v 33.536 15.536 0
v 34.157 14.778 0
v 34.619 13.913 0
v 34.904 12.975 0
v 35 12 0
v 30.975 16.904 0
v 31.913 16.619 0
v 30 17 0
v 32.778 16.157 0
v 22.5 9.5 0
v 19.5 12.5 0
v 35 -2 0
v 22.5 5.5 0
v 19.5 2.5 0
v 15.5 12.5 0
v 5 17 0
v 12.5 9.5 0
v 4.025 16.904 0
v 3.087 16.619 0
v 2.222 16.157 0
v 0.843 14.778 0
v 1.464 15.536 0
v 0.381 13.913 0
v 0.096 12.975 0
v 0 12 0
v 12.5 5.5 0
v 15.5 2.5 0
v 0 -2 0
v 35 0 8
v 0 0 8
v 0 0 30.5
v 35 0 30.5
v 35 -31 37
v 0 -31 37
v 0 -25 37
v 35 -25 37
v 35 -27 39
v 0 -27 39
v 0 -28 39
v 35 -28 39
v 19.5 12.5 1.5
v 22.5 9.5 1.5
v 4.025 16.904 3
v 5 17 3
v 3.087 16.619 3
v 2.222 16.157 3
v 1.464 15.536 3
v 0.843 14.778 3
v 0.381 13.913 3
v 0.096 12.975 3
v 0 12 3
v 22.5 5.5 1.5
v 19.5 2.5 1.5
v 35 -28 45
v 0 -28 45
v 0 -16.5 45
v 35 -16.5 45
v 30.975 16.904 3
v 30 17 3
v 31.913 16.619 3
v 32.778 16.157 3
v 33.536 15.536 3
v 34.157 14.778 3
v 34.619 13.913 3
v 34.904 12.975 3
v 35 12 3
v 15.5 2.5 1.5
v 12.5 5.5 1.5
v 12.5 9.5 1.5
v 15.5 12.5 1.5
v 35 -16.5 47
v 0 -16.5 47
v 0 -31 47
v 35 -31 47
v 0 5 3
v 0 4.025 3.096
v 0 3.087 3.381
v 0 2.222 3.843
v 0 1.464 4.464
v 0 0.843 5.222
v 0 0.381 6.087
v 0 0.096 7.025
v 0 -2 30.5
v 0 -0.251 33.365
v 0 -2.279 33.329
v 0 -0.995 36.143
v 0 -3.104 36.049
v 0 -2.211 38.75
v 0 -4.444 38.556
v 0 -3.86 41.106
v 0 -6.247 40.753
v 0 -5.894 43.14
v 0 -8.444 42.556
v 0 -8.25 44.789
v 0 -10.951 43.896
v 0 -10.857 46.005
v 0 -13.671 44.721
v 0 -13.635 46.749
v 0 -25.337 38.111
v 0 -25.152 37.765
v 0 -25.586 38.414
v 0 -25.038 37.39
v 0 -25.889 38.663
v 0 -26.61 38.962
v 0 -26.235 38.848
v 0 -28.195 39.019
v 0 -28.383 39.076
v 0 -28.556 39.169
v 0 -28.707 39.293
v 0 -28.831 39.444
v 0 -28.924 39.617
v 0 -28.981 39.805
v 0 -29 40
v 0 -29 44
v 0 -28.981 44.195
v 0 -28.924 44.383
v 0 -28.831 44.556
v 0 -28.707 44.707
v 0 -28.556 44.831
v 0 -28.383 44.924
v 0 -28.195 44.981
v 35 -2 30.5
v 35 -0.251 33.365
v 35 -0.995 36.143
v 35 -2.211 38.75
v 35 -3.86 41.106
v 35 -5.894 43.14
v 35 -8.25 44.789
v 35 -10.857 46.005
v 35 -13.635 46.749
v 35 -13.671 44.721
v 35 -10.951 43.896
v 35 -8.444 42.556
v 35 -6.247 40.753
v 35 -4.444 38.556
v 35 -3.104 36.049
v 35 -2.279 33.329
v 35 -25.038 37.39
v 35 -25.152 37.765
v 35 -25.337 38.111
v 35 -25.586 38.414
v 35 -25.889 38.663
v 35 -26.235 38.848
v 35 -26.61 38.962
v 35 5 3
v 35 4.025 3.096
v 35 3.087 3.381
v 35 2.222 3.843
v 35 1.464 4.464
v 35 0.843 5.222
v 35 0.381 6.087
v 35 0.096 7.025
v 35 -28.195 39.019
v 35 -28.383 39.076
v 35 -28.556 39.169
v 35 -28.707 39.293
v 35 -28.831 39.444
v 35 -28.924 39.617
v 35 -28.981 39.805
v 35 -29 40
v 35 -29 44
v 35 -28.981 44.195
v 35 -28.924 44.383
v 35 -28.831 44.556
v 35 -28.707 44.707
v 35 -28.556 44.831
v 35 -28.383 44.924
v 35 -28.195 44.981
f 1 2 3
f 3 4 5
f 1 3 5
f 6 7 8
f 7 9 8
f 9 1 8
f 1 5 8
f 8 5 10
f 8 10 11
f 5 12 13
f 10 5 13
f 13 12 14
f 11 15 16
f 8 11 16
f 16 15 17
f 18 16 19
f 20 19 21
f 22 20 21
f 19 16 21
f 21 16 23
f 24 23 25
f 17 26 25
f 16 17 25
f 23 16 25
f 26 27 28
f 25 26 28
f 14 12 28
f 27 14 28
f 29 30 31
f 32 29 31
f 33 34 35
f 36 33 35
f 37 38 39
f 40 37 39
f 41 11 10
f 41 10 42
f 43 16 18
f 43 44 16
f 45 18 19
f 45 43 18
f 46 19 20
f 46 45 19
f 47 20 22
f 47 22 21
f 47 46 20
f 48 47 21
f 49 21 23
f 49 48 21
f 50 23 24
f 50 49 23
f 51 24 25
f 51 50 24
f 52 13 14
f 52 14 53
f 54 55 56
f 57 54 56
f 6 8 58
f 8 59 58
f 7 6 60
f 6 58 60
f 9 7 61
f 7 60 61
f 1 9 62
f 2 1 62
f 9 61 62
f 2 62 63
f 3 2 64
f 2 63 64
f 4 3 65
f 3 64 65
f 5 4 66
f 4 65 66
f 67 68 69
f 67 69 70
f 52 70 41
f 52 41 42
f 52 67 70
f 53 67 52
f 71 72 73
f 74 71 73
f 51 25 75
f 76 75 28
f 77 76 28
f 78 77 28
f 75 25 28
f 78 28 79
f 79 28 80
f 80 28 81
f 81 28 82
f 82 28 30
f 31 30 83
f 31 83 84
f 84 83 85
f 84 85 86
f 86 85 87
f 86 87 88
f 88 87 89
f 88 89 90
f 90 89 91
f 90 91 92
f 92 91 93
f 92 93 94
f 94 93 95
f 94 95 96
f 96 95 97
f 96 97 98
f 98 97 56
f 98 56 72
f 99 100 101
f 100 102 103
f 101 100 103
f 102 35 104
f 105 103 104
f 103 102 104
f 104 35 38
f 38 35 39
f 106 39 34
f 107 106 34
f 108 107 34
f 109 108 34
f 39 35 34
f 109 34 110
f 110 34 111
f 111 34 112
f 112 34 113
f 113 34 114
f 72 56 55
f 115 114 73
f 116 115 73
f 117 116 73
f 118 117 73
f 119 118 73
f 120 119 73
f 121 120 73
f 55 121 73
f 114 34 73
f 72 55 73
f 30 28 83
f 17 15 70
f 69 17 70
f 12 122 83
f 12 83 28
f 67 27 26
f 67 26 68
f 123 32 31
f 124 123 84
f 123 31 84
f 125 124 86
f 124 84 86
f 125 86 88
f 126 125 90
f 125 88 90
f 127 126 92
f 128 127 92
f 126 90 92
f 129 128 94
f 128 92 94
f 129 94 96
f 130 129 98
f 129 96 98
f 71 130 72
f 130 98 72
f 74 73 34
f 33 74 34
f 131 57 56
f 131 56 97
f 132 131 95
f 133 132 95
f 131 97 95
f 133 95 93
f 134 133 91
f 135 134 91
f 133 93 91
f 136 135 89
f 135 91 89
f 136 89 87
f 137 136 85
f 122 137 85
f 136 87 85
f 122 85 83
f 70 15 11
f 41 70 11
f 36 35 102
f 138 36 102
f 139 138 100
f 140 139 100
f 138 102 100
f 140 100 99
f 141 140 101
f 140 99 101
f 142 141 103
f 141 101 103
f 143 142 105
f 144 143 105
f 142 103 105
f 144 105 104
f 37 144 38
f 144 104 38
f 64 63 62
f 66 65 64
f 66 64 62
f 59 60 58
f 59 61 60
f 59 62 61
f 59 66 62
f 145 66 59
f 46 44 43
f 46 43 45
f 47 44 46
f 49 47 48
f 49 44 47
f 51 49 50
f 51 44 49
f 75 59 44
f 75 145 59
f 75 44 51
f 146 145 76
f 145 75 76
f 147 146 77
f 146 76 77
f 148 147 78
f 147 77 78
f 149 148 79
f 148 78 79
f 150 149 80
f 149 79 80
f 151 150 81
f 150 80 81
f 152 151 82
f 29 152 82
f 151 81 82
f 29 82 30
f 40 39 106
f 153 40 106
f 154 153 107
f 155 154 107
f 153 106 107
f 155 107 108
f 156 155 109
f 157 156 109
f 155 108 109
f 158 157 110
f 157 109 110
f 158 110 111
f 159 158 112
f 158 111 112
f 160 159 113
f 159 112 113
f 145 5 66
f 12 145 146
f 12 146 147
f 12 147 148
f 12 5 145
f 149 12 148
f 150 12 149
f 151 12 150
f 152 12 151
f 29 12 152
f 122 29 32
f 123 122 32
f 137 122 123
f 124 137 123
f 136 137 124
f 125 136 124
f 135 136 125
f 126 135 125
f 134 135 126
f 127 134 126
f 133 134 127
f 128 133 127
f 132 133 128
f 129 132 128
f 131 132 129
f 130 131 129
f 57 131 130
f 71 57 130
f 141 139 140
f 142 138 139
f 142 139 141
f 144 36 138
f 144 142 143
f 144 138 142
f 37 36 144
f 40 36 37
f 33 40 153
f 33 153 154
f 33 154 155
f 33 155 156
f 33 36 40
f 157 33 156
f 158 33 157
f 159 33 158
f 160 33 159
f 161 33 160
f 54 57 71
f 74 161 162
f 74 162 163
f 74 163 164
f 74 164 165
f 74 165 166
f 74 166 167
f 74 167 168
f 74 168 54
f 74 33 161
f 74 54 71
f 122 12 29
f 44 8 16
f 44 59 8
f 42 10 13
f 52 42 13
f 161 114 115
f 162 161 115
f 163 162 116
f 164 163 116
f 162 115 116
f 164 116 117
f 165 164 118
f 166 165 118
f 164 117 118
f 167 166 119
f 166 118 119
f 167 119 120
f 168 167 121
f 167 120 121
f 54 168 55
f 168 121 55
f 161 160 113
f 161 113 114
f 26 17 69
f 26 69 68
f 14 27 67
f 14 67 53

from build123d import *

# Parameters (mm, degrees)
F1_DEPTH = 35
F2_W     = 35
F2_H     = 3
F3_DEPTH = 17
F4_W     = 10
F4_H     = 10
F5_DEPTH = 1.5
F6_SIZE  = 3
F7_R     = 5


with BuildPart() as f1:
    # F0 (on Right) → F1 (new body)
    with BuildSketch(Plane.YZ):
        with BuildLine():
            ThreePointArc((-29, 44), (-28.7071067812, 44.7071067812), (-28, 45))
            Line((-28, 45), (-16.5, 45))
            ThreePointArc((-16.5, 45), (-6.2469516728, 40.7530483272), (-2, 30.5))
            Line((-2, 30.5), (-2, 0))
            Line((-2, 0), (0, 0))
            Line((0, 0), (0, 30.5))
            ThreePointArc((0, 30.5), (-4.8327381104, 42.1672618896), (-16.5, 47))
            Line((-16.5, 47), (-31, 47))
            Line((-31, 47), (-31, 37))
            Line((-31, 37), (-25, 37))
            ThreePointArc((-25, 37), (-25.5857864376, 38.4142135624), (-27, 39))
            Line((-27, 39), (-28, 39))
            ThreePointArc((-28, 39), (-28.7071067812, 39.2928932188), (-29, 40))
            Line((-29, 40), (-29, 44))
        make_face()
    extrude(amount=F1_DEPTH)

    # F2 (on face) → F3 (join)
    with BuildSketch(Plane(origin=(0, 0, 0), x_dir=(-1, 0, 0), z_dir=(0, 1, 0))):
        with Locations((-17.5, 1.5)):
            Rectangle(F2_W, F2_H)
    extrude(amount=F3_DEPTH)

    # F4 (on face) → F5 (cut)
    with BuildSketch(Plane(origin=(0, 0, 0), x_dir=(1, 0, 0), z_dir=(0, 0, -1))):
        with Locations((17.5, -7.5)):
            Rectangle(F4_W, F4_H)
    extrude(amount=-F5_DEPTH, mode=Mode.SUBTRACT)

    # F6
    f6_edges = [f1.edges().sort_by_distance(p)[0] for p in [
        (22.5, 2.5, 0.75),
        (22.5, 12.5, 0.75),
        (12.5, 12.5, 0.75),
        (12.5, 2.5, 0.75),
    ]]
    chamfer(f6_edges, length=F6_SIZE)

    # F7
    f7_edges = [f1.edges().sort_by_distance(p)[0] for p in [
        (0, 17, 1.5),
        (35, 17, 1.5),
        (17.5, 0, 3),
    ]]
    fillet(f7_edges, radius=F7_R)


solid = f1.part
